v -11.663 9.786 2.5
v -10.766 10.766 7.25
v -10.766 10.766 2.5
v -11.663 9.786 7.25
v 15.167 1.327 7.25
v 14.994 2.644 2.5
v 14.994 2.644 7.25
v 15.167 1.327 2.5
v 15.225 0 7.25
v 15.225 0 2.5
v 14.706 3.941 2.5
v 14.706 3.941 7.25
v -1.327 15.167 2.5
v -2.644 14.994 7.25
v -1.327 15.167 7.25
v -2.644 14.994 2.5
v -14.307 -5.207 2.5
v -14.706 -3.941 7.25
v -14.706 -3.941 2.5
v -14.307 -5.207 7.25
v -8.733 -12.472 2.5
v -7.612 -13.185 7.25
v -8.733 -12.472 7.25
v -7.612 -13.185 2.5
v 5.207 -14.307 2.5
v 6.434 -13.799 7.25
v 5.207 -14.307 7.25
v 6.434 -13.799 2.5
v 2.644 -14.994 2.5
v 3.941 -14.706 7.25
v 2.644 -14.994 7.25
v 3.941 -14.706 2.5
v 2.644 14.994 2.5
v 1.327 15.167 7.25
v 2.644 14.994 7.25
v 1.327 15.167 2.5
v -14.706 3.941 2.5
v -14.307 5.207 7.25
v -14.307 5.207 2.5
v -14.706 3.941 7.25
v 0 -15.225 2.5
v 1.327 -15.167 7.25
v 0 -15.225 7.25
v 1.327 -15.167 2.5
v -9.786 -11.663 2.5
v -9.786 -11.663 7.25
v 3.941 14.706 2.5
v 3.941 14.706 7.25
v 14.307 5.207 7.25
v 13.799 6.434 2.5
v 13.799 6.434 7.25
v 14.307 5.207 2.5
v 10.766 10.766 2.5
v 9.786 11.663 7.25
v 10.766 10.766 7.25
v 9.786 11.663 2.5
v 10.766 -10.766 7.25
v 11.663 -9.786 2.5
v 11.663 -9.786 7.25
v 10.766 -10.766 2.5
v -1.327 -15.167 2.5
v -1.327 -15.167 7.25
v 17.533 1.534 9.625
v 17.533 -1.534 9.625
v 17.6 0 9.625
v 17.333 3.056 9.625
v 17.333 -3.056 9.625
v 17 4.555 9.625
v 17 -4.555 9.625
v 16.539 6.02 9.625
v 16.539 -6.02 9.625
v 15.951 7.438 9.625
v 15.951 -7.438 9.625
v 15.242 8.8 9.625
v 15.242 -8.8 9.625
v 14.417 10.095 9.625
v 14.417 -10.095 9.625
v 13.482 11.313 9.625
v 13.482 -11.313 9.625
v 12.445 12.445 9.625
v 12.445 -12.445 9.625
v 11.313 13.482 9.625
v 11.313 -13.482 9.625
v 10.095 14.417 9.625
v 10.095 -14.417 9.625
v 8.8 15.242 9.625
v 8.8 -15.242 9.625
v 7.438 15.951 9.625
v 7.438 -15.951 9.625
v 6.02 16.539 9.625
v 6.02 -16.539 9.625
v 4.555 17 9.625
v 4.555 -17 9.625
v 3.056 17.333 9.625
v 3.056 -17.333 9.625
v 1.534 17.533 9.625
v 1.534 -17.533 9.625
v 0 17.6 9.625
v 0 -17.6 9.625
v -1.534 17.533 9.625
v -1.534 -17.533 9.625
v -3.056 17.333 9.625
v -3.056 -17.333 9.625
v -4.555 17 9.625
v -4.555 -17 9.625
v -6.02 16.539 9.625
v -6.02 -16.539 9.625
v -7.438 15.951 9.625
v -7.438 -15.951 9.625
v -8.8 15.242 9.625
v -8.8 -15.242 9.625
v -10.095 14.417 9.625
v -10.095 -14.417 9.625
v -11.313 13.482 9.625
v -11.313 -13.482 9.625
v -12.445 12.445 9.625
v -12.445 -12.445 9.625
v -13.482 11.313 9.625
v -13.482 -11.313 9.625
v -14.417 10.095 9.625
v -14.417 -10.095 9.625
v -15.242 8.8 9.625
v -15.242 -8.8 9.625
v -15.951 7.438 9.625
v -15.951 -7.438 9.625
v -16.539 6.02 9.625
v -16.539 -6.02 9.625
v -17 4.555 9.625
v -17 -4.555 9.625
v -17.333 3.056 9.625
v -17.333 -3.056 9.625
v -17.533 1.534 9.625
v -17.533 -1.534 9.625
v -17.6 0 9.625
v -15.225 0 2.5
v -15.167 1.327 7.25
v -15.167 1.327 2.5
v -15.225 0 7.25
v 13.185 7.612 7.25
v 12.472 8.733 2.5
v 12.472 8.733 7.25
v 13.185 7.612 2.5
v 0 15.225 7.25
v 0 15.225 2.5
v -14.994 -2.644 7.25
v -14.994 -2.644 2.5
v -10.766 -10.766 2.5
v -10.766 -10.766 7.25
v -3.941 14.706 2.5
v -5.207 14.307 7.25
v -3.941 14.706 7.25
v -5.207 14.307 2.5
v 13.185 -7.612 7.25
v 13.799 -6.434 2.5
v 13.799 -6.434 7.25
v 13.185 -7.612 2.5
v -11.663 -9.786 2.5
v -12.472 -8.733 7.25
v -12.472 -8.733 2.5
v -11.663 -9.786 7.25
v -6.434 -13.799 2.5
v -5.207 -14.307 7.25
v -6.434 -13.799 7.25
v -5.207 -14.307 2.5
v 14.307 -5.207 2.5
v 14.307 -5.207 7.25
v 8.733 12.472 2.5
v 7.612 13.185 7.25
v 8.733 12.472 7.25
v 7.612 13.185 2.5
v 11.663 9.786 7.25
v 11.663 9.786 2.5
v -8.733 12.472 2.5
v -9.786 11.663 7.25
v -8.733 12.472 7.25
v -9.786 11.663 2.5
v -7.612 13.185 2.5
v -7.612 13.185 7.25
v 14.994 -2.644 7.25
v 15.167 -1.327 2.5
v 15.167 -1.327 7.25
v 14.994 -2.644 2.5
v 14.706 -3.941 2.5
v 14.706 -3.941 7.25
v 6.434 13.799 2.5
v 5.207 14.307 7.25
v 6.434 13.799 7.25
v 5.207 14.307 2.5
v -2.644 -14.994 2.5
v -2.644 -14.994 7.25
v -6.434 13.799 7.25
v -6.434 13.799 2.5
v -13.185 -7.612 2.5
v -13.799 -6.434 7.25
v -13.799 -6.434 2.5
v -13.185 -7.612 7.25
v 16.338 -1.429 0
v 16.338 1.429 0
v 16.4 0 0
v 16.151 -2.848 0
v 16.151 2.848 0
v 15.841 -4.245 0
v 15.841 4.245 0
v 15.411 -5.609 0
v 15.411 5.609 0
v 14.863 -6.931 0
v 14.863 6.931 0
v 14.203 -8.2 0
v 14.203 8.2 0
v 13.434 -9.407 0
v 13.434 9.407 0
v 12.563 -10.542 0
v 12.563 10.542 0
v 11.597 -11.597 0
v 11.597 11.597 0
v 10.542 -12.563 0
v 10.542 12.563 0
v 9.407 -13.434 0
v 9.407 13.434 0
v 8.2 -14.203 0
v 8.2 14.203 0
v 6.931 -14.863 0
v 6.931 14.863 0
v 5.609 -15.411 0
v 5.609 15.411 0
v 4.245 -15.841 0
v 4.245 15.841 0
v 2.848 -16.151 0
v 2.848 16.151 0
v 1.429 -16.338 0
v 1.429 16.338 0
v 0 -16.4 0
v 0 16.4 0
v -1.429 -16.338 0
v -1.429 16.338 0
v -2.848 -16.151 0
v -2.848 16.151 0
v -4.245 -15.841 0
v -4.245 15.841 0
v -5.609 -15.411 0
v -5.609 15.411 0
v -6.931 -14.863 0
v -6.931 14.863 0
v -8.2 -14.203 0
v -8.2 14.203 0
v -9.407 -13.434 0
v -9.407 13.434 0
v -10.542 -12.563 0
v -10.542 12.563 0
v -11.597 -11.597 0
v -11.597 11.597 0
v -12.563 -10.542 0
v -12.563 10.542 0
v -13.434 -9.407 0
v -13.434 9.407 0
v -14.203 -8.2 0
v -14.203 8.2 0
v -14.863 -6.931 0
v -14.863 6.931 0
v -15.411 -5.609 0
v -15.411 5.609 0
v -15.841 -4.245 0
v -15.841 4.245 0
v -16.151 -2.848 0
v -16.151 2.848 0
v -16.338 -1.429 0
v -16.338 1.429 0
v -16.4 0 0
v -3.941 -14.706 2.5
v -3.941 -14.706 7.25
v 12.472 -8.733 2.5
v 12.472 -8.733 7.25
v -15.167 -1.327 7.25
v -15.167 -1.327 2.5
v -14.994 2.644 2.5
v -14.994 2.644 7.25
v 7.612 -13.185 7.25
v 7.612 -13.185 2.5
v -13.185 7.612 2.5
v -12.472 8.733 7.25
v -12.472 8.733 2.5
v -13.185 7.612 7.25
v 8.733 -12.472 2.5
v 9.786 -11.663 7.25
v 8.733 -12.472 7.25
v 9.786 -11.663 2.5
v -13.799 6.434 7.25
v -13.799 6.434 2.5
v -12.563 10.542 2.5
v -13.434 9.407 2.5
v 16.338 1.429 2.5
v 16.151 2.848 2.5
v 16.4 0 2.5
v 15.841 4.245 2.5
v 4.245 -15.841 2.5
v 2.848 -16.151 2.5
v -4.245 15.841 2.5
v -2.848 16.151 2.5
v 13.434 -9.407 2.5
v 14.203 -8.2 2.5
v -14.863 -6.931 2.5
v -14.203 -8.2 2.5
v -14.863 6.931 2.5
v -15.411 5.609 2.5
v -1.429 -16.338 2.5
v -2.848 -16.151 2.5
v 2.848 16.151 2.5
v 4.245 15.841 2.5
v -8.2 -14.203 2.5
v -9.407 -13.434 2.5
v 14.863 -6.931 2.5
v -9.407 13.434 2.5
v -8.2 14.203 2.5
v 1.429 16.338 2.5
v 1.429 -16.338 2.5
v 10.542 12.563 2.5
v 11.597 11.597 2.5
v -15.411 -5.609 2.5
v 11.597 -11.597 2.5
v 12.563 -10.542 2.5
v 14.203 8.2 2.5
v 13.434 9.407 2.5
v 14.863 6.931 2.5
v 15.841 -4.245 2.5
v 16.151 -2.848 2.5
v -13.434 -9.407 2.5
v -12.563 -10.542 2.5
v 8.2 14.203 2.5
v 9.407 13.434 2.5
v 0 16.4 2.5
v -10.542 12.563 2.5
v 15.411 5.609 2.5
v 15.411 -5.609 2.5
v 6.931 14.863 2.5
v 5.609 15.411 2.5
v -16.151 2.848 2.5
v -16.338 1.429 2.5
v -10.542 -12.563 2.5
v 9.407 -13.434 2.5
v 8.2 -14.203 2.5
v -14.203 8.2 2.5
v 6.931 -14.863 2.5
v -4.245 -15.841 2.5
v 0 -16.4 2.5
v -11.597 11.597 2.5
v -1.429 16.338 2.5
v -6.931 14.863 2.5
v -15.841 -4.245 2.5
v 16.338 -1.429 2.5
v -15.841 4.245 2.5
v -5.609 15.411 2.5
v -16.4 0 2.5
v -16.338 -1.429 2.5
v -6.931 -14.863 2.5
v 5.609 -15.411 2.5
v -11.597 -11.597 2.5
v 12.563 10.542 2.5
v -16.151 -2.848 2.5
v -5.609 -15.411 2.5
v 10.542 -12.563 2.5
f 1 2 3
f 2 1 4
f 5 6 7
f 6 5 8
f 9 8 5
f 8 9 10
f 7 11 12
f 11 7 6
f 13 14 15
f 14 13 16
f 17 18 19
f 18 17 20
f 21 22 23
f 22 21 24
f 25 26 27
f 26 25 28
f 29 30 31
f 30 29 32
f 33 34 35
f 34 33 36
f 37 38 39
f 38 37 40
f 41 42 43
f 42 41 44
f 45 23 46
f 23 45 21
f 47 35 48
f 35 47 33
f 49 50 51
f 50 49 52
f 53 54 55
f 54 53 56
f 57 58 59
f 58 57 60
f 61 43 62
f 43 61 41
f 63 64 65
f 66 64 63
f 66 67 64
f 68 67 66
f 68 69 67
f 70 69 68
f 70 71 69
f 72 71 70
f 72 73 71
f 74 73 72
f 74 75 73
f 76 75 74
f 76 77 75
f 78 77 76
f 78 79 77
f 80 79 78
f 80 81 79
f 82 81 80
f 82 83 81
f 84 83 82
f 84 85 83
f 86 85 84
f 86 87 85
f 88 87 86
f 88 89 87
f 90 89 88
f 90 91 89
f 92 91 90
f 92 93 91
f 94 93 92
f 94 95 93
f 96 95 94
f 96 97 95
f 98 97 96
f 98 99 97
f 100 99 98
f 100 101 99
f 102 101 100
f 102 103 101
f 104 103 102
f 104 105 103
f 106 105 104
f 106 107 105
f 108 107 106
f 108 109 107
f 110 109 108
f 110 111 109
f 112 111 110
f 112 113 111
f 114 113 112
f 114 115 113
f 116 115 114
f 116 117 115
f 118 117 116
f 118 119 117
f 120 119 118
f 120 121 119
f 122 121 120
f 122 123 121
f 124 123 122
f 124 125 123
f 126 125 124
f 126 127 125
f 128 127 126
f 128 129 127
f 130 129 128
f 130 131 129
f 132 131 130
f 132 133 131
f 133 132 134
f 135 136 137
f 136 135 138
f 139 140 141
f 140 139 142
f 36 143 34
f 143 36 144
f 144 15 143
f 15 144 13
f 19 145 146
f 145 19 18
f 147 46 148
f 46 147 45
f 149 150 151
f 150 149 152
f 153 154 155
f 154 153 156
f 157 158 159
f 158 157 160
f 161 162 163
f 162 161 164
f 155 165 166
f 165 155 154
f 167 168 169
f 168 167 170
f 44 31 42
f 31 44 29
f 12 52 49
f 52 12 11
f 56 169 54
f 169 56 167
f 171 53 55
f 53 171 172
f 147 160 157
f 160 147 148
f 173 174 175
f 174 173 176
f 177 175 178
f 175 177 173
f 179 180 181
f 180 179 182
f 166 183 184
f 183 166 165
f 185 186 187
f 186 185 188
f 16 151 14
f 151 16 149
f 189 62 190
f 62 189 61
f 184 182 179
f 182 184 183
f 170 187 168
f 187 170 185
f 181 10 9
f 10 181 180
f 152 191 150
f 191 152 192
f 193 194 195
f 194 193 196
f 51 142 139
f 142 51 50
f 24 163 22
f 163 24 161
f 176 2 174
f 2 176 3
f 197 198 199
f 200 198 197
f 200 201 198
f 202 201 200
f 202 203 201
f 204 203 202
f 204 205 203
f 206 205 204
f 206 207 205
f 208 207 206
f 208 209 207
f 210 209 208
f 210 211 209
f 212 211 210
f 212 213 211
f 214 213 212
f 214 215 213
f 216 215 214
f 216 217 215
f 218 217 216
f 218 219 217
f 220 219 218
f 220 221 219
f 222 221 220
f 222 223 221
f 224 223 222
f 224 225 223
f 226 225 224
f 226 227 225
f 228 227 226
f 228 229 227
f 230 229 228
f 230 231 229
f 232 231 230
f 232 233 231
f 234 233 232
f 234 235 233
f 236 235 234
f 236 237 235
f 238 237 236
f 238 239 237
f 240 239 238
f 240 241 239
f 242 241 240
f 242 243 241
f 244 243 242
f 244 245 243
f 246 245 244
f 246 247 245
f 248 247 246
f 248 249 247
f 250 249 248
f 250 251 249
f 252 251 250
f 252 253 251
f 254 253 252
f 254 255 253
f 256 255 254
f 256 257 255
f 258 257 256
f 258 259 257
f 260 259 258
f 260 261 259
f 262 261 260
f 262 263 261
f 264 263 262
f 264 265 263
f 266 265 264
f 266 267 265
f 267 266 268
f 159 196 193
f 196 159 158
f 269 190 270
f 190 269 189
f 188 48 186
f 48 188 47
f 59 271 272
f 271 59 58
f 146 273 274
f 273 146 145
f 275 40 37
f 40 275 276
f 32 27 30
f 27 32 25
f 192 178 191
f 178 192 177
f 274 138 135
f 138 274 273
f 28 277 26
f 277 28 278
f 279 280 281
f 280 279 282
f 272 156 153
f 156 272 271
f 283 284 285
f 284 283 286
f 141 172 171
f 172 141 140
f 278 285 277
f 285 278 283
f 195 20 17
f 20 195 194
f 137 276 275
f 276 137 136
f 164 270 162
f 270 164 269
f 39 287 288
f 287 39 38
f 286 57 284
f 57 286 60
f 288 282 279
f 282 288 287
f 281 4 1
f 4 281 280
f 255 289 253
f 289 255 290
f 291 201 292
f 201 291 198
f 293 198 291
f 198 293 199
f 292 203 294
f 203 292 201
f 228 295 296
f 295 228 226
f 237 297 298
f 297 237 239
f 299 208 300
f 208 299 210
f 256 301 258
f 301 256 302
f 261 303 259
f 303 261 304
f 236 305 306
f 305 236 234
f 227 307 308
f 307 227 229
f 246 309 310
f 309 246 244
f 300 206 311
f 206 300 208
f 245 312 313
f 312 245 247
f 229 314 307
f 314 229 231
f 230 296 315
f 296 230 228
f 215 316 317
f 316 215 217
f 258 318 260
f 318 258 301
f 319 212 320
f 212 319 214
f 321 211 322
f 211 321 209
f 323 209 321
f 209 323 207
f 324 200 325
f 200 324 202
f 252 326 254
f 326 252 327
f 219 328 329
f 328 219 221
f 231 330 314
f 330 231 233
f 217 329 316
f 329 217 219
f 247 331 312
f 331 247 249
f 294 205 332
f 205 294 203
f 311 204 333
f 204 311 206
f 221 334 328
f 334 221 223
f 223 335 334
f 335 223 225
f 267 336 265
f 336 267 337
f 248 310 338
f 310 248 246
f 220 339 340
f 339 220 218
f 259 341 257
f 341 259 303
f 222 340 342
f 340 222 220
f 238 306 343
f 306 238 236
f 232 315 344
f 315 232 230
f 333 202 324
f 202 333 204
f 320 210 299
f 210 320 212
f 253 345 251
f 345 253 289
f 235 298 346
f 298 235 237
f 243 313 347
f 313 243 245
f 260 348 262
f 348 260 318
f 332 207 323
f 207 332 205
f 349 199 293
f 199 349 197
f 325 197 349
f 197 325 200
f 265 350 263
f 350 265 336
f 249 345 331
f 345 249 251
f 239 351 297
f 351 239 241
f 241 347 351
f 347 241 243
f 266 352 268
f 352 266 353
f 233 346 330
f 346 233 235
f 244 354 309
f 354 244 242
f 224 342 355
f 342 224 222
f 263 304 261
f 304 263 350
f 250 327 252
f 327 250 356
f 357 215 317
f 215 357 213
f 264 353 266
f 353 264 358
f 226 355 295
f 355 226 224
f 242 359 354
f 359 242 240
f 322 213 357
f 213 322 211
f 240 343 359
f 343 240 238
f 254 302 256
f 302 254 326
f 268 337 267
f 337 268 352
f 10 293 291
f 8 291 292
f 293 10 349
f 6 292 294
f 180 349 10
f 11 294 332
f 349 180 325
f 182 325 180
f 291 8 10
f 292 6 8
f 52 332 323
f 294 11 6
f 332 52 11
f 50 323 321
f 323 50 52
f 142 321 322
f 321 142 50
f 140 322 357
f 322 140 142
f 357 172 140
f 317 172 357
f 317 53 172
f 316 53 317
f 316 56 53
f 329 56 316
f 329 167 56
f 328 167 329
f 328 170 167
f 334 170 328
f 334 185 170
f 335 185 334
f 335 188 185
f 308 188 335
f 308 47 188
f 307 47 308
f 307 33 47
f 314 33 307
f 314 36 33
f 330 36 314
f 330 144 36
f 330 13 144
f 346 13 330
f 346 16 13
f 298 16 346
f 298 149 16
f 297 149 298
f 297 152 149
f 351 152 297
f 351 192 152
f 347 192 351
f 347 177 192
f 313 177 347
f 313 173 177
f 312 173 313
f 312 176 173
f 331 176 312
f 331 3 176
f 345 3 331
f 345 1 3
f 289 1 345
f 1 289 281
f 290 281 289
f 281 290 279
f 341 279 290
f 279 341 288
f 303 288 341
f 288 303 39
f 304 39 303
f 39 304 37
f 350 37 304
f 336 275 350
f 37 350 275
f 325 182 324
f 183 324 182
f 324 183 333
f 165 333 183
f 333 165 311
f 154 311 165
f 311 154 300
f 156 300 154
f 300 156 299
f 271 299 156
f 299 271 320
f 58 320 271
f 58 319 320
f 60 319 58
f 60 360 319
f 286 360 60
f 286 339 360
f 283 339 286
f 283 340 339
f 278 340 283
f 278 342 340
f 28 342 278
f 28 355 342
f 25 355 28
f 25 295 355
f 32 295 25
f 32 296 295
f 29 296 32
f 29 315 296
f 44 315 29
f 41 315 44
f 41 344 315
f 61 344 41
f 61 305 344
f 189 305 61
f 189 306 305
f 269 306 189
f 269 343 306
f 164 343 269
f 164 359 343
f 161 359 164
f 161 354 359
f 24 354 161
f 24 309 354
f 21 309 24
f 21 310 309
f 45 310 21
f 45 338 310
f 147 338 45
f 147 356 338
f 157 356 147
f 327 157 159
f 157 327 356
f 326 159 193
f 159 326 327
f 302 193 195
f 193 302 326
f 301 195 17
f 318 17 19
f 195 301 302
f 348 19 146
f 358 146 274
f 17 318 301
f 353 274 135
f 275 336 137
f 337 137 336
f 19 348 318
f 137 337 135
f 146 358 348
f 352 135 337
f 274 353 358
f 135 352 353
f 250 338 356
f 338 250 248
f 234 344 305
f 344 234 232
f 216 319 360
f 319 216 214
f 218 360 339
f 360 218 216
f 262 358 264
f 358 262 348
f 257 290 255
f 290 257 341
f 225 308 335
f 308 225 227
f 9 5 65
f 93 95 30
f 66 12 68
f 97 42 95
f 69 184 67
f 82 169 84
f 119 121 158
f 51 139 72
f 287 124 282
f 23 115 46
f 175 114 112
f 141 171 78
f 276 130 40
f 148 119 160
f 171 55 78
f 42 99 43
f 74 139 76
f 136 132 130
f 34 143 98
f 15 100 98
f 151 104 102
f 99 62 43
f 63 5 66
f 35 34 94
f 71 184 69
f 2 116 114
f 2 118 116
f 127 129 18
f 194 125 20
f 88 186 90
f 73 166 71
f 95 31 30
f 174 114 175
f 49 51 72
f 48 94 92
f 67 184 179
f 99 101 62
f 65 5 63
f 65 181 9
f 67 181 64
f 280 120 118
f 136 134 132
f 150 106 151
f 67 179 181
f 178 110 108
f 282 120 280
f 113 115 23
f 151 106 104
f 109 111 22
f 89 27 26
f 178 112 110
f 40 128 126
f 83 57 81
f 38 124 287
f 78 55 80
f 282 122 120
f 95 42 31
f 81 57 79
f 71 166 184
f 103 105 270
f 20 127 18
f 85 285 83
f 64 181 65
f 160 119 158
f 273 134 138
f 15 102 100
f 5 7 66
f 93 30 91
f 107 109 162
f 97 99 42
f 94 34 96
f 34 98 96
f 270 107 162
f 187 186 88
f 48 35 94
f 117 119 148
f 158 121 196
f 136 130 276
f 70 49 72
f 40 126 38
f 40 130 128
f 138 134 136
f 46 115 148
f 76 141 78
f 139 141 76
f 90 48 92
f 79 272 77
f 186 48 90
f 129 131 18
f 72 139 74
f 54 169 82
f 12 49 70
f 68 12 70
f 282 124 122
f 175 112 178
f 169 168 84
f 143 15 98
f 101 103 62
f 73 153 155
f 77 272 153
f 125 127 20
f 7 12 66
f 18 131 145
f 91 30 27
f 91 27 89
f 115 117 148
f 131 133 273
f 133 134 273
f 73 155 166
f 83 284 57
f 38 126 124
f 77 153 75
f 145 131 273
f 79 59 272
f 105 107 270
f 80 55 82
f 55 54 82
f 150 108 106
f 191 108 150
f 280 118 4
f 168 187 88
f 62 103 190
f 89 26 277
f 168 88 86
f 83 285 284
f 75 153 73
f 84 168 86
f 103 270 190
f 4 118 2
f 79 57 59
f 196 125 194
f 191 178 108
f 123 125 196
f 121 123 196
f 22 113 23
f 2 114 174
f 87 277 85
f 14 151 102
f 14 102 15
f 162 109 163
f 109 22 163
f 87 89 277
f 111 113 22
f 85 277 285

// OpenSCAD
gap = 5;
id = 29.85;
od = 35.2;
gapTolerance = -.25;
radialTolerance = -.3;
outerRimThickness = 2.5; // increase!?
outerRimDiameter = 32.8;

module dummy(){}

$fn=72;

gap1 = gap+gapTolerance;
id1 = id-2*radialTolerance;

upperRimThickness = (od-id1)/2;
cylinder(d=id1,h=outerRimThickness+upperRimThickness+gap1);
cylinder(d=outerRimDiameter,h=outerRimThickness);
translate([0,0,outerRimThickness+gap1]) cylinder(d1=id1,d2=od,h=upperRimThickness);
